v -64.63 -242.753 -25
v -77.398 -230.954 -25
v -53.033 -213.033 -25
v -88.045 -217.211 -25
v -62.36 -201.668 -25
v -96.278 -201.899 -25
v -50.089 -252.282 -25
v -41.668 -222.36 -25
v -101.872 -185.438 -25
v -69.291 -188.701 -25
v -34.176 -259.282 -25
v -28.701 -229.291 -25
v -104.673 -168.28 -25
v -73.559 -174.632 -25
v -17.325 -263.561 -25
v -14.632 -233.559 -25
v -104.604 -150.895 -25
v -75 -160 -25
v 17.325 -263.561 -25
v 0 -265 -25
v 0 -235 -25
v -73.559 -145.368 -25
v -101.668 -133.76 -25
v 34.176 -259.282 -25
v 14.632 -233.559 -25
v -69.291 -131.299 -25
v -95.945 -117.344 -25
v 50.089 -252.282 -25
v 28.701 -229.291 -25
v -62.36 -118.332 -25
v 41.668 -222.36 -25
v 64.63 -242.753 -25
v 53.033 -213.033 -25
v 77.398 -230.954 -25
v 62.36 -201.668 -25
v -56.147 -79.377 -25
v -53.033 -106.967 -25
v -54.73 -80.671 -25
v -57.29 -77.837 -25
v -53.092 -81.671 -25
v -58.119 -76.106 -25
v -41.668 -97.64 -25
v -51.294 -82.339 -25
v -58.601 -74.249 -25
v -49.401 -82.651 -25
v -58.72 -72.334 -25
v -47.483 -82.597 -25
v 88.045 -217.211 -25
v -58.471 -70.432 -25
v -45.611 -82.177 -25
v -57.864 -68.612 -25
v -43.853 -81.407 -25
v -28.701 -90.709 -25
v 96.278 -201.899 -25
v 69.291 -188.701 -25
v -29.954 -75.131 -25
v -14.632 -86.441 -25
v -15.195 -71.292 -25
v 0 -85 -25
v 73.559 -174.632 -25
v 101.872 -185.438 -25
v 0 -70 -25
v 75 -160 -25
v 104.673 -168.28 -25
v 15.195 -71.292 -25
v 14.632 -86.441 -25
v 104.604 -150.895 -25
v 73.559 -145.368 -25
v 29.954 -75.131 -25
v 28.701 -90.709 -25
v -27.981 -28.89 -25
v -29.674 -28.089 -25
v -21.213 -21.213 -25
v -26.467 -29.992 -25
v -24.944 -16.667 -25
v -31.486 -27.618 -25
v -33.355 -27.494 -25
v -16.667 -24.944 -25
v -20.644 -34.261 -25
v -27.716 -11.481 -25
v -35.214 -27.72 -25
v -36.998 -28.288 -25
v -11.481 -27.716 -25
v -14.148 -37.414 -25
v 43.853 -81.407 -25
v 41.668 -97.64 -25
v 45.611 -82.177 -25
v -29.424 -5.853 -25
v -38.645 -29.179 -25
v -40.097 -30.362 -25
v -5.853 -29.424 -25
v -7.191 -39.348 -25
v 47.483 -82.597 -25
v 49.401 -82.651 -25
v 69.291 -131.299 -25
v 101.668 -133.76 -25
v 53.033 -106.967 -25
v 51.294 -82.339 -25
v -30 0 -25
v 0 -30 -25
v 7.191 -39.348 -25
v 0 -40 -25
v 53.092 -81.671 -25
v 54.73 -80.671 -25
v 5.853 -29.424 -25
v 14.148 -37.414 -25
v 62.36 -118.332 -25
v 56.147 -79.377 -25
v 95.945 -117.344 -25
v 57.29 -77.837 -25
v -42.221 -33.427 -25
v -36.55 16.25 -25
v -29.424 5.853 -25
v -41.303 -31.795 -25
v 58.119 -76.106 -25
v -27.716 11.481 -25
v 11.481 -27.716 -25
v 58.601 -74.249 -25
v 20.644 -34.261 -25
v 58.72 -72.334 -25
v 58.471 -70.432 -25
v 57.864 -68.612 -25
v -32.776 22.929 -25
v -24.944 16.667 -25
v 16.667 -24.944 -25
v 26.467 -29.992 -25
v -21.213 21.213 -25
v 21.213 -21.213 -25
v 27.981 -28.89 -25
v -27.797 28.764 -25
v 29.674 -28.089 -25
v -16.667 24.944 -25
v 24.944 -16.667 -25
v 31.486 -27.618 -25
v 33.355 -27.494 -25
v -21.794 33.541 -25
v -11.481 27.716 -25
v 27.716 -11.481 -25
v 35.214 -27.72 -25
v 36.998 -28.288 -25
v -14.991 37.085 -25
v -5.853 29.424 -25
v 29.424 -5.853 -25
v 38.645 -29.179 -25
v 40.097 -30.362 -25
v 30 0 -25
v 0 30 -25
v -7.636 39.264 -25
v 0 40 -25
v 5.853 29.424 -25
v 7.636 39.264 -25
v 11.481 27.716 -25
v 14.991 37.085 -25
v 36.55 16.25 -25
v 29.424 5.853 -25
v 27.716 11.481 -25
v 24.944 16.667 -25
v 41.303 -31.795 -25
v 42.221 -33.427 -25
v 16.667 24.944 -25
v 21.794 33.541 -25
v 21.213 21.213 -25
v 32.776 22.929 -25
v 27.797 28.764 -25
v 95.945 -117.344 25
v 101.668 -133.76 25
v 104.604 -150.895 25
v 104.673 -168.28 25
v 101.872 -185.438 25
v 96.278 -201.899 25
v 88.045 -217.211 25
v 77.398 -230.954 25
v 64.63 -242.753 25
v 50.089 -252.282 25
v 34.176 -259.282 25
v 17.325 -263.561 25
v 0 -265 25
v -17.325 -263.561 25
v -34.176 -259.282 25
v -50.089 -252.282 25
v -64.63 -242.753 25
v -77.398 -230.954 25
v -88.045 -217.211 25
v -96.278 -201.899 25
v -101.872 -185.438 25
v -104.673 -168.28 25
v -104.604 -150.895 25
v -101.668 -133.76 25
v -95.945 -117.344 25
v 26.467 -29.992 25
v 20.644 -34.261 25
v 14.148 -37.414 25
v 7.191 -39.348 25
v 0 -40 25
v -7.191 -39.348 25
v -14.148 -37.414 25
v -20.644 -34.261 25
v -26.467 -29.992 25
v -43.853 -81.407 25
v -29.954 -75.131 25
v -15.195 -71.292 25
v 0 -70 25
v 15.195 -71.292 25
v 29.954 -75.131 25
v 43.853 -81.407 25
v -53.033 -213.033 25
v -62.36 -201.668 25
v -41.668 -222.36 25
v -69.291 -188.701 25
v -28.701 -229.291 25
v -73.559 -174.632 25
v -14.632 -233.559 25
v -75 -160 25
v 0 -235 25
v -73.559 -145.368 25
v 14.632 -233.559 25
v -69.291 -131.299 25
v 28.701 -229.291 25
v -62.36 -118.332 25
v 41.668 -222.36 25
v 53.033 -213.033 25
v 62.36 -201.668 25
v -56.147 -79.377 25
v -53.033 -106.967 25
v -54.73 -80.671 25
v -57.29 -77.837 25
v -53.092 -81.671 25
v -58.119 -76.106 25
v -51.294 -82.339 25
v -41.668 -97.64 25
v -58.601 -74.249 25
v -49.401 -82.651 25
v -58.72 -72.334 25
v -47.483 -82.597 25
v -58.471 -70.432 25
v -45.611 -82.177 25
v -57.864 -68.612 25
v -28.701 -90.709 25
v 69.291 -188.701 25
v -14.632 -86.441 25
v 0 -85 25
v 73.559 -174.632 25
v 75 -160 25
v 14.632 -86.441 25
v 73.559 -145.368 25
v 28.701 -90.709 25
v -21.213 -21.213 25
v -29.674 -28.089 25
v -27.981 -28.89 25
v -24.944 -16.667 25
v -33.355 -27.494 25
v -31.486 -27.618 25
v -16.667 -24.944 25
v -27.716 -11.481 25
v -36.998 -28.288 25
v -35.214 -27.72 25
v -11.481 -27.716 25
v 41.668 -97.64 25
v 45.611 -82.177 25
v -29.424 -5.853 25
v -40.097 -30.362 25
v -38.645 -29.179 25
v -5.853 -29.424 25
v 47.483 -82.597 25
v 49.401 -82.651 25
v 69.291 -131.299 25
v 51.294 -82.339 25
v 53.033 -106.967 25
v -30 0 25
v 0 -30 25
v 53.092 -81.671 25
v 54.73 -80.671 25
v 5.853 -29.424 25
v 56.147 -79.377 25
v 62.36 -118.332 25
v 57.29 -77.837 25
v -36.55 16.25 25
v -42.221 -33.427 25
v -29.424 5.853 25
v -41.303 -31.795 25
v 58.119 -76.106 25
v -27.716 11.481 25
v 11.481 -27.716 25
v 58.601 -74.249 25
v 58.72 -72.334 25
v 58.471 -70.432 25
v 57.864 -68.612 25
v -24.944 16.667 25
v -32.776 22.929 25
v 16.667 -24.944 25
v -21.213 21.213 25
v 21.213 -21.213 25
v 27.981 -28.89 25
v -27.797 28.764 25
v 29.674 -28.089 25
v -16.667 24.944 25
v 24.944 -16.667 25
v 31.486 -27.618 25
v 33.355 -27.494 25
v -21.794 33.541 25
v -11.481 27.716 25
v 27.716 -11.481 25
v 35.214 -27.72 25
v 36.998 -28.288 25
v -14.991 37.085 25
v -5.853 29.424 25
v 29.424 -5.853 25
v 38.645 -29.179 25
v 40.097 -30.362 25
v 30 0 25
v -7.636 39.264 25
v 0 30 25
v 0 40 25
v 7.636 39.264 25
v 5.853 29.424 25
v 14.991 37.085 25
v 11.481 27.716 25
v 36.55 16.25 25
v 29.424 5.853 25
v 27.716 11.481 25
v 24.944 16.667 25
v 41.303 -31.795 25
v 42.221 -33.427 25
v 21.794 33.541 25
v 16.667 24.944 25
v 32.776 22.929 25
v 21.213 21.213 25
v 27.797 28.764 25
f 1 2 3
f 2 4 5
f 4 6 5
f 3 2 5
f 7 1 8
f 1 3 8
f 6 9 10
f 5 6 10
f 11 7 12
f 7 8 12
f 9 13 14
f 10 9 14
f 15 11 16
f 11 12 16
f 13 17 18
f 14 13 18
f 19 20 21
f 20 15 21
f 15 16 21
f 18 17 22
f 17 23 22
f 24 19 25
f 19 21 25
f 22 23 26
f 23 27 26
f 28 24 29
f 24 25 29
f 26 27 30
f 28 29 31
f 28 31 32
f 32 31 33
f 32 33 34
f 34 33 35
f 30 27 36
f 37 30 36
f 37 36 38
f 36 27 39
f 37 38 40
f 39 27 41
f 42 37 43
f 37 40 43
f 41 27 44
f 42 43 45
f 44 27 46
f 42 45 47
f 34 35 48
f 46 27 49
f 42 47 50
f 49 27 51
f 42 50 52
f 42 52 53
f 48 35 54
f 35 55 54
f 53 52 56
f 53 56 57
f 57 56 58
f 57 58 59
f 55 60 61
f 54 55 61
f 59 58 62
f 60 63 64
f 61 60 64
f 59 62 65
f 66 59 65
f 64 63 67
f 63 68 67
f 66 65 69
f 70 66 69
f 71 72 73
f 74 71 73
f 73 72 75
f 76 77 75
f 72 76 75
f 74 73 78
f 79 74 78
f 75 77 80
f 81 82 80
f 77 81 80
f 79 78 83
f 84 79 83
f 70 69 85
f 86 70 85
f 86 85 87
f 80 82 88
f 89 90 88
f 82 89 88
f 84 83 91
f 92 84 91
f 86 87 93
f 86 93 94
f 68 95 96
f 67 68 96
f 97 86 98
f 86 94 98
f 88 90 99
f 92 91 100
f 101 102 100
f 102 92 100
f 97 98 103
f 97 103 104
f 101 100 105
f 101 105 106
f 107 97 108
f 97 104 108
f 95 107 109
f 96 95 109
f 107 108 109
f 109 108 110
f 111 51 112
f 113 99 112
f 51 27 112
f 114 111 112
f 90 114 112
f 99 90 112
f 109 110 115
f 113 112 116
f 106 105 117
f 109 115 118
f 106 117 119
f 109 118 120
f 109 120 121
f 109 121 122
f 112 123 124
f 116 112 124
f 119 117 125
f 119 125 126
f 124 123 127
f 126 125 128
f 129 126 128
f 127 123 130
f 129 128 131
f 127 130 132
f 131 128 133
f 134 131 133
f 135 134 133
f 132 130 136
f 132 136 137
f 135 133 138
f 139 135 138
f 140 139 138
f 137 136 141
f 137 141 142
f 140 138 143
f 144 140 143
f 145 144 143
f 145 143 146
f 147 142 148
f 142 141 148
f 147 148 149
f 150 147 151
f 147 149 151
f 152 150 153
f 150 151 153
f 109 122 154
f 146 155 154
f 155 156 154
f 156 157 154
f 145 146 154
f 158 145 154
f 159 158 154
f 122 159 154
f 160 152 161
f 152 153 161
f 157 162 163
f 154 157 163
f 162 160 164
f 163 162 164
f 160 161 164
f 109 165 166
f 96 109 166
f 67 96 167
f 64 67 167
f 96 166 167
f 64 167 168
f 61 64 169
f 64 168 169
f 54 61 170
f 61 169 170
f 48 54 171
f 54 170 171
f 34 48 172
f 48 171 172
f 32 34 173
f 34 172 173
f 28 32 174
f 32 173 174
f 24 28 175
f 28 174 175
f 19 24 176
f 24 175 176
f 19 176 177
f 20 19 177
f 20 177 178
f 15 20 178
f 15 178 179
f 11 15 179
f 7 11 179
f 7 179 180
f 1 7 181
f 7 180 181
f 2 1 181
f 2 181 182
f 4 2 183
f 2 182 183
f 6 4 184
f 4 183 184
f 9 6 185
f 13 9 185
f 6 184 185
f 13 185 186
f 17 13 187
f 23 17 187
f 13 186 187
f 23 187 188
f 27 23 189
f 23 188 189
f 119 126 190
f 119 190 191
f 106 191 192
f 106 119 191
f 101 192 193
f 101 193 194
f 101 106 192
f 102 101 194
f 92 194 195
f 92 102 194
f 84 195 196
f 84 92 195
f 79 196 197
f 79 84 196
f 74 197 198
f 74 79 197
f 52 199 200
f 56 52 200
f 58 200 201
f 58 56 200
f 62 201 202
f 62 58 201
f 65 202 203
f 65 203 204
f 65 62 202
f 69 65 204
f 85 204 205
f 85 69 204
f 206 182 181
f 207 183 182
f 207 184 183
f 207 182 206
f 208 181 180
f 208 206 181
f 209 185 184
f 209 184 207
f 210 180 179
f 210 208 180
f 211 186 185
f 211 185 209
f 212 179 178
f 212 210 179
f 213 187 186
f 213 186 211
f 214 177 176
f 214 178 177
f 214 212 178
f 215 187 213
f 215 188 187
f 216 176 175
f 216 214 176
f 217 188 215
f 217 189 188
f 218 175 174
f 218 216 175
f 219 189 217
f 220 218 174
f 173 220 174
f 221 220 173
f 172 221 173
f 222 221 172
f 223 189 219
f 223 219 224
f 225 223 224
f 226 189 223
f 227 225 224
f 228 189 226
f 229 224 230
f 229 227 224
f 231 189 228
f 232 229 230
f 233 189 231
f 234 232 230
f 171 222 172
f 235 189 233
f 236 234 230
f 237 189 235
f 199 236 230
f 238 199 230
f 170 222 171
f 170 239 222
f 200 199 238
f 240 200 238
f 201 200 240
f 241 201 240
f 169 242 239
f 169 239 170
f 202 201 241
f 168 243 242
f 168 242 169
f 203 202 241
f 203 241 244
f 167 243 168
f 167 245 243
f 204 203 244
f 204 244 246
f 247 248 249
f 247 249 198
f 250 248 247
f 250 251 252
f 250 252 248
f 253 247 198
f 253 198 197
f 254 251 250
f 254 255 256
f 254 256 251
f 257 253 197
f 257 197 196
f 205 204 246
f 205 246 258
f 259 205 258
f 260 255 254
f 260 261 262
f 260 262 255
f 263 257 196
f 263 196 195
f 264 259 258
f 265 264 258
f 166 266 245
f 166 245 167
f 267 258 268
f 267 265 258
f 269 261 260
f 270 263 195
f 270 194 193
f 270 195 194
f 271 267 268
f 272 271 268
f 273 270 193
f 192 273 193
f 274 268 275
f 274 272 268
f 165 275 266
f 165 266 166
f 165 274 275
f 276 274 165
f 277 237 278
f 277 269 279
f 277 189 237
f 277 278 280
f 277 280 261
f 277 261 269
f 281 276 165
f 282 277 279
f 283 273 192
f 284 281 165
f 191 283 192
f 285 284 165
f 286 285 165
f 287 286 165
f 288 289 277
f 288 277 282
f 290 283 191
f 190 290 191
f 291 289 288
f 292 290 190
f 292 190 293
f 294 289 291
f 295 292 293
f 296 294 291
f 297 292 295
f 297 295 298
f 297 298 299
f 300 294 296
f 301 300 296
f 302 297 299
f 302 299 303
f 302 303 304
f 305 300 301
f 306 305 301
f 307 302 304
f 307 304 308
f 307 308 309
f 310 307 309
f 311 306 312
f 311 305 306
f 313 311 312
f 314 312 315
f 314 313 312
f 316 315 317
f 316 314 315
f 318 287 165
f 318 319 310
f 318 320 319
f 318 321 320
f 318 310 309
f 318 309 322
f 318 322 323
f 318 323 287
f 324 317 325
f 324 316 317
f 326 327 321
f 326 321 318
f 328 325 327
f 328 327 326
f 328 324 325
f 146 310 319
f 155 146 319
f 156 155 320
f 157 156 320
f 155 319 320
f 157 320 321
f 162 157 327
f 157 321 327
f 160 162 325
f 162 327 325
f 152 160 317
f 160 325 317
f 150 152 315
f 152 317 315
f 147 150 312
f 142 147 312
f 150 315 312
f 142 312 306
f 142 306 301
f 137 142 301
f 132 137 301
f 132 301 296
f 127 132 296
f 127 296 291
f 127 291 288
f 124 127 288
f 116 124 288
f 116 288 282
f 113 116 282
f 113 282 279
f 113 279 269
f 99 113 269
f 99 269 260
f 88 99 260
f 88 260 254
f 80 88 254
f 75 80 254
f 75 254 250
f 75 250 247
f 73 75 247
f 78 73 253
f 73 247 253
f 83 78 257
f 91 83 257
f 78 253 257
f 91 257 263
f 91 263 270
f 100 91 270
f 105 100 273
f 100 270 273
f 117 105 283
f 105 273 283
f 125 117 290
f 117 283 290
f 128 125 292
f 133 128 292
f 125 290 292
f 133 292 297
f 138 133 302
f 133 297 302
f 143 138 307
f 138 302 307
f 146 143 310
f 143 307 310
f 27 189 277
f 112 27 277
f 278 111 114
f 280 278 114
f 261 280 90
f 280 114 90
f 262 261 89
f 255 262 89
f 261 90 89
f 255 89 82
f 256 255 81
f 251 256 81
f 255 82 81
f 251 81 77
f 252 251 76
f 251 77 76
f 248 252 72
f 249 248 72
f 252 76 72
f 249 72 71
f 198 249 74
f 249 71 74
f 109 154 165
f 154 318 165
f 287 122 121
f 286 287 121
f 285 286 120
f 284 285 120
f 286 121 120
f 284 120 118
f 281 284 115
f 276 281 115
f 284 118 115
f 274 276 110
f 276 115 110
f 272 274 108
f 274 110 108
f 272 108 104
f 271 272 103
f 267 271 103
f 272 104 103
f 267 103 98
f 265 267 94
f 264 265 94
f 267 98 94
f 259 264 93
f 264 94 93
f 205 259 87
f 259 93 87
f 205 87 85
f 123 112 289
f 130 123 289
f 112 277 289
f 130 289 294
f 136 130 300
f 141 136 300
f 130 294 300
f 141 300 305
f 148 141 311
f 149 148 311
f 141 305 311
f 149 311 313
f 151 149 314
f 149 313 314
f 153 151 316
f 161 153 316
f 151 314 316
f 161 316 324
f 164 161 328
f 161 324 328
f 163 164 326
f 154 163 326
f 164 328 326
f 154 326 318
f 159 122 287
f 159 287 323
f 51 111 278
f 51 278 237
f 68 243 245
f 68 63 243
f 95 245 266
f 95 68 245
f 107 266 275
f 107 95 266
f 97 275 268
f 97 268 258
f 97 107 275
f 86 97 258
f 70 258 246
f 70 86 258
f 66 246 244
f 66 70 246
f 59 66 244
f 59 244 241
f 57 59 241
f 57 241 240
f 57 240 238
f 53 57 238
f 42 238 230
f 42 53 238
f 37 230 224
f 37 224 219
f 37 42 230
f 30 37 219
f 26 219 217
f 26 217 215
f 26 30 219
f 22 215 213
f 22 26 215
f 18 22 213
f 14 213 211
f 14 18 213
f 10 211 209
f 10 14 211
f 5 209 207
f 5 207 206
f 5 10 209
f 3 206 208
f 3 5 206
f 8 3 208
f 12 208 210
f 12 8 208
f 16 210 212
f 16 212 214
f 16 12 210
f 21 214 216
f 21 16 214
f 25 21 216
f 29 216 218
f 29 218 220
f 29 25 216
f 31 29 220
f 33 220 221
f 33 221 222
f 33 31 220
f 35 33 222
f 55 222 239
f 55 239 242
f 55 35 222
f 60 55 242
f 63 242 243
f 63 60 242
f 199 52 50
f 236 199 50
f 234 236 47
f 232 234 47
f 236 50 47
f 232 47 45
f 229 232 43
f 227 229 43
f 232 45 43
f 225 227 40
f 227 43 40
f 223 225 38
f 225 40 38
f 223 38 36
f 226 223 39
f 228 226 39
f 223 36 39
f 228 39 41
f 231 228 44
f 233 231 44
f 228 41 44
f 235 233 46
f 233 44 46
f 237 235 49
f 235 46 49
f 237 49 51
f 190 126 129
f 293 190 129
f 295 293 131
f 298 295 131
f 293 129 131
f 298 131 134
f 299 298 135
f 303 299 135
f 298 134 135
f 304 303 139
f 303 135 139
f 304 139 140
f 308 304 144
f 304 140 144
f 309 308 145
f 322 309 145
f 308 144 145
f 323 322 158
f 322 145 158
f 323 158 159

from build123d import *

# Parameters (mm, degrees)
SKETCH1_R               = 75
BOSS_EXTRUDE1_DEPTH     = 25
CUT_EXTRUDE1_DEPTH      = 287.138078556
CUT_EXTRUDE1_DEPTH_BACK = 287.138078556
FILLET1_START           = -25
FILLET1_DEPTH           = 50
SKETCH3_R               = 30
CUT_EXTRUDE2_DEPTH      = 290.39592257


with BuildPart() as part:
    # Sketch1 → Boss-Extrude1 (new, symmetric)
    with BuildSketch(Plane.XY):
        with BuildLine():
            Line((-95.945006832, -117.34375), (-36.550478793, 16.25))
            ThreePointArc((-36.550478793, 16.25), (0, 40), (36.550478793, 16.25))
            Line((36.550478793, 16.25), (95.945006832, -117.34375))
            ThreePointArc((95.945006832, -117.34375), (0, -265), (-95.945006832, -117.34375))
        make_face()
        with Locations((0, -160)):
            Circle(SKETCH1_R, mode=Mode.SUBTRACT)
    extrude(amount=BOSS_EXTRUDE1_DEPTH, both=True)

    # Sketch2 → Cut-Extrude1 (cut, two sides: drawn at the far end of the back side and taken through both)
    with BuildSketch(Plane.XY.offset(-CUT_EXTRUDE1_DEPTH_BACK)):
        with BuildLine():
            Line((-35.52920143, -18.375958363), (-82.238577284, -123.4375))
            ThreePointArc((-82.238577284, -123.4375), (0, -70), (82.238577284, -123.4375))
            Line((82.238577284, -123.4375), (35.52920143, -18.375958363))
            ThreePointArc((35.52920143, -18.375958363), (0, -40), (-35.52920143, -18.375958363))
        make_face()
    extrude(amount=CUT_EXTRUDE1_DEPTH + CUT_EXTRUDE1_DEPTH_BACK, mode=Mode.SUBTRACT)

    # Fillet1: read off the stored shape, not the designer's step
    # Fillet1 outline → Fillet1 (add)
    with BuildSketch(Plane.XY.offset(FILLET1_START)):
        with BuildLine():
            ThreePointArc((-42.220939274, -33.427418189), (-35.213916082, -27.719526256), (-26.466655661, -29.991934551))
            ThreePointArc((-26.466655661, -29.991934551), (-31.537347698, -24.604790188), (-35.52920143, -18.375958363))
            Line((-35.52920143, -18.375958363), (-42.220939274, -33.427418189))
        make_face()
        with BuildLine():
            ThreePointArc((35.52920143, -18.375958363), (31.537347698, -24.604790188), (26.466655661, -29.991934551))
            ThreePointArc((26.466655661, -29.991934551), (35.213916082, -27.719526256), (42.220939274, -33.427418189))
            Line((42.220939274, -33.427418189), (35.52920143, -18.375958363))
        make_face()
        with BuildLine():
            ThreePointArc((-43.853361827, -81.406853629), (-55.469552548, -80.058313703), (-57.863577284, -68.61178181))
            Line((-57.863577284, -68.61178181), (-82.238577284, -123.4375))
            ThreePointArc((-82.238577284, -123.4375), (-66.45628703, -99.30764534), (-43.853361827, -81.406853629))
        make_face()
        with BuildLine():
            Line((82.238577284, -123.4375), (57.863577284, -68.61178181))
            ThreePointArc((57.863577284, -68.61178181), (55.469552548, -80.058313703), (43.853361827, -81.406853629))
            ThreePointArc((43.853361827, -81.406853629), (66.45628703, -99.30764534), (82.238577284, -123.4375))
        make_face()
    extrude(amount=FILLET1_DEPTH)

    # Sketch3 → Cut-Extrude2 (cut, through all)
    with BuildSketch(Plane.XY.offset(25)):
        Circle(SKETCH3_R)
    extrude(amount=-CUT_EXTRUDE2_DEPTH, mode=Mode.SUBTRACT)


solid = part.part
